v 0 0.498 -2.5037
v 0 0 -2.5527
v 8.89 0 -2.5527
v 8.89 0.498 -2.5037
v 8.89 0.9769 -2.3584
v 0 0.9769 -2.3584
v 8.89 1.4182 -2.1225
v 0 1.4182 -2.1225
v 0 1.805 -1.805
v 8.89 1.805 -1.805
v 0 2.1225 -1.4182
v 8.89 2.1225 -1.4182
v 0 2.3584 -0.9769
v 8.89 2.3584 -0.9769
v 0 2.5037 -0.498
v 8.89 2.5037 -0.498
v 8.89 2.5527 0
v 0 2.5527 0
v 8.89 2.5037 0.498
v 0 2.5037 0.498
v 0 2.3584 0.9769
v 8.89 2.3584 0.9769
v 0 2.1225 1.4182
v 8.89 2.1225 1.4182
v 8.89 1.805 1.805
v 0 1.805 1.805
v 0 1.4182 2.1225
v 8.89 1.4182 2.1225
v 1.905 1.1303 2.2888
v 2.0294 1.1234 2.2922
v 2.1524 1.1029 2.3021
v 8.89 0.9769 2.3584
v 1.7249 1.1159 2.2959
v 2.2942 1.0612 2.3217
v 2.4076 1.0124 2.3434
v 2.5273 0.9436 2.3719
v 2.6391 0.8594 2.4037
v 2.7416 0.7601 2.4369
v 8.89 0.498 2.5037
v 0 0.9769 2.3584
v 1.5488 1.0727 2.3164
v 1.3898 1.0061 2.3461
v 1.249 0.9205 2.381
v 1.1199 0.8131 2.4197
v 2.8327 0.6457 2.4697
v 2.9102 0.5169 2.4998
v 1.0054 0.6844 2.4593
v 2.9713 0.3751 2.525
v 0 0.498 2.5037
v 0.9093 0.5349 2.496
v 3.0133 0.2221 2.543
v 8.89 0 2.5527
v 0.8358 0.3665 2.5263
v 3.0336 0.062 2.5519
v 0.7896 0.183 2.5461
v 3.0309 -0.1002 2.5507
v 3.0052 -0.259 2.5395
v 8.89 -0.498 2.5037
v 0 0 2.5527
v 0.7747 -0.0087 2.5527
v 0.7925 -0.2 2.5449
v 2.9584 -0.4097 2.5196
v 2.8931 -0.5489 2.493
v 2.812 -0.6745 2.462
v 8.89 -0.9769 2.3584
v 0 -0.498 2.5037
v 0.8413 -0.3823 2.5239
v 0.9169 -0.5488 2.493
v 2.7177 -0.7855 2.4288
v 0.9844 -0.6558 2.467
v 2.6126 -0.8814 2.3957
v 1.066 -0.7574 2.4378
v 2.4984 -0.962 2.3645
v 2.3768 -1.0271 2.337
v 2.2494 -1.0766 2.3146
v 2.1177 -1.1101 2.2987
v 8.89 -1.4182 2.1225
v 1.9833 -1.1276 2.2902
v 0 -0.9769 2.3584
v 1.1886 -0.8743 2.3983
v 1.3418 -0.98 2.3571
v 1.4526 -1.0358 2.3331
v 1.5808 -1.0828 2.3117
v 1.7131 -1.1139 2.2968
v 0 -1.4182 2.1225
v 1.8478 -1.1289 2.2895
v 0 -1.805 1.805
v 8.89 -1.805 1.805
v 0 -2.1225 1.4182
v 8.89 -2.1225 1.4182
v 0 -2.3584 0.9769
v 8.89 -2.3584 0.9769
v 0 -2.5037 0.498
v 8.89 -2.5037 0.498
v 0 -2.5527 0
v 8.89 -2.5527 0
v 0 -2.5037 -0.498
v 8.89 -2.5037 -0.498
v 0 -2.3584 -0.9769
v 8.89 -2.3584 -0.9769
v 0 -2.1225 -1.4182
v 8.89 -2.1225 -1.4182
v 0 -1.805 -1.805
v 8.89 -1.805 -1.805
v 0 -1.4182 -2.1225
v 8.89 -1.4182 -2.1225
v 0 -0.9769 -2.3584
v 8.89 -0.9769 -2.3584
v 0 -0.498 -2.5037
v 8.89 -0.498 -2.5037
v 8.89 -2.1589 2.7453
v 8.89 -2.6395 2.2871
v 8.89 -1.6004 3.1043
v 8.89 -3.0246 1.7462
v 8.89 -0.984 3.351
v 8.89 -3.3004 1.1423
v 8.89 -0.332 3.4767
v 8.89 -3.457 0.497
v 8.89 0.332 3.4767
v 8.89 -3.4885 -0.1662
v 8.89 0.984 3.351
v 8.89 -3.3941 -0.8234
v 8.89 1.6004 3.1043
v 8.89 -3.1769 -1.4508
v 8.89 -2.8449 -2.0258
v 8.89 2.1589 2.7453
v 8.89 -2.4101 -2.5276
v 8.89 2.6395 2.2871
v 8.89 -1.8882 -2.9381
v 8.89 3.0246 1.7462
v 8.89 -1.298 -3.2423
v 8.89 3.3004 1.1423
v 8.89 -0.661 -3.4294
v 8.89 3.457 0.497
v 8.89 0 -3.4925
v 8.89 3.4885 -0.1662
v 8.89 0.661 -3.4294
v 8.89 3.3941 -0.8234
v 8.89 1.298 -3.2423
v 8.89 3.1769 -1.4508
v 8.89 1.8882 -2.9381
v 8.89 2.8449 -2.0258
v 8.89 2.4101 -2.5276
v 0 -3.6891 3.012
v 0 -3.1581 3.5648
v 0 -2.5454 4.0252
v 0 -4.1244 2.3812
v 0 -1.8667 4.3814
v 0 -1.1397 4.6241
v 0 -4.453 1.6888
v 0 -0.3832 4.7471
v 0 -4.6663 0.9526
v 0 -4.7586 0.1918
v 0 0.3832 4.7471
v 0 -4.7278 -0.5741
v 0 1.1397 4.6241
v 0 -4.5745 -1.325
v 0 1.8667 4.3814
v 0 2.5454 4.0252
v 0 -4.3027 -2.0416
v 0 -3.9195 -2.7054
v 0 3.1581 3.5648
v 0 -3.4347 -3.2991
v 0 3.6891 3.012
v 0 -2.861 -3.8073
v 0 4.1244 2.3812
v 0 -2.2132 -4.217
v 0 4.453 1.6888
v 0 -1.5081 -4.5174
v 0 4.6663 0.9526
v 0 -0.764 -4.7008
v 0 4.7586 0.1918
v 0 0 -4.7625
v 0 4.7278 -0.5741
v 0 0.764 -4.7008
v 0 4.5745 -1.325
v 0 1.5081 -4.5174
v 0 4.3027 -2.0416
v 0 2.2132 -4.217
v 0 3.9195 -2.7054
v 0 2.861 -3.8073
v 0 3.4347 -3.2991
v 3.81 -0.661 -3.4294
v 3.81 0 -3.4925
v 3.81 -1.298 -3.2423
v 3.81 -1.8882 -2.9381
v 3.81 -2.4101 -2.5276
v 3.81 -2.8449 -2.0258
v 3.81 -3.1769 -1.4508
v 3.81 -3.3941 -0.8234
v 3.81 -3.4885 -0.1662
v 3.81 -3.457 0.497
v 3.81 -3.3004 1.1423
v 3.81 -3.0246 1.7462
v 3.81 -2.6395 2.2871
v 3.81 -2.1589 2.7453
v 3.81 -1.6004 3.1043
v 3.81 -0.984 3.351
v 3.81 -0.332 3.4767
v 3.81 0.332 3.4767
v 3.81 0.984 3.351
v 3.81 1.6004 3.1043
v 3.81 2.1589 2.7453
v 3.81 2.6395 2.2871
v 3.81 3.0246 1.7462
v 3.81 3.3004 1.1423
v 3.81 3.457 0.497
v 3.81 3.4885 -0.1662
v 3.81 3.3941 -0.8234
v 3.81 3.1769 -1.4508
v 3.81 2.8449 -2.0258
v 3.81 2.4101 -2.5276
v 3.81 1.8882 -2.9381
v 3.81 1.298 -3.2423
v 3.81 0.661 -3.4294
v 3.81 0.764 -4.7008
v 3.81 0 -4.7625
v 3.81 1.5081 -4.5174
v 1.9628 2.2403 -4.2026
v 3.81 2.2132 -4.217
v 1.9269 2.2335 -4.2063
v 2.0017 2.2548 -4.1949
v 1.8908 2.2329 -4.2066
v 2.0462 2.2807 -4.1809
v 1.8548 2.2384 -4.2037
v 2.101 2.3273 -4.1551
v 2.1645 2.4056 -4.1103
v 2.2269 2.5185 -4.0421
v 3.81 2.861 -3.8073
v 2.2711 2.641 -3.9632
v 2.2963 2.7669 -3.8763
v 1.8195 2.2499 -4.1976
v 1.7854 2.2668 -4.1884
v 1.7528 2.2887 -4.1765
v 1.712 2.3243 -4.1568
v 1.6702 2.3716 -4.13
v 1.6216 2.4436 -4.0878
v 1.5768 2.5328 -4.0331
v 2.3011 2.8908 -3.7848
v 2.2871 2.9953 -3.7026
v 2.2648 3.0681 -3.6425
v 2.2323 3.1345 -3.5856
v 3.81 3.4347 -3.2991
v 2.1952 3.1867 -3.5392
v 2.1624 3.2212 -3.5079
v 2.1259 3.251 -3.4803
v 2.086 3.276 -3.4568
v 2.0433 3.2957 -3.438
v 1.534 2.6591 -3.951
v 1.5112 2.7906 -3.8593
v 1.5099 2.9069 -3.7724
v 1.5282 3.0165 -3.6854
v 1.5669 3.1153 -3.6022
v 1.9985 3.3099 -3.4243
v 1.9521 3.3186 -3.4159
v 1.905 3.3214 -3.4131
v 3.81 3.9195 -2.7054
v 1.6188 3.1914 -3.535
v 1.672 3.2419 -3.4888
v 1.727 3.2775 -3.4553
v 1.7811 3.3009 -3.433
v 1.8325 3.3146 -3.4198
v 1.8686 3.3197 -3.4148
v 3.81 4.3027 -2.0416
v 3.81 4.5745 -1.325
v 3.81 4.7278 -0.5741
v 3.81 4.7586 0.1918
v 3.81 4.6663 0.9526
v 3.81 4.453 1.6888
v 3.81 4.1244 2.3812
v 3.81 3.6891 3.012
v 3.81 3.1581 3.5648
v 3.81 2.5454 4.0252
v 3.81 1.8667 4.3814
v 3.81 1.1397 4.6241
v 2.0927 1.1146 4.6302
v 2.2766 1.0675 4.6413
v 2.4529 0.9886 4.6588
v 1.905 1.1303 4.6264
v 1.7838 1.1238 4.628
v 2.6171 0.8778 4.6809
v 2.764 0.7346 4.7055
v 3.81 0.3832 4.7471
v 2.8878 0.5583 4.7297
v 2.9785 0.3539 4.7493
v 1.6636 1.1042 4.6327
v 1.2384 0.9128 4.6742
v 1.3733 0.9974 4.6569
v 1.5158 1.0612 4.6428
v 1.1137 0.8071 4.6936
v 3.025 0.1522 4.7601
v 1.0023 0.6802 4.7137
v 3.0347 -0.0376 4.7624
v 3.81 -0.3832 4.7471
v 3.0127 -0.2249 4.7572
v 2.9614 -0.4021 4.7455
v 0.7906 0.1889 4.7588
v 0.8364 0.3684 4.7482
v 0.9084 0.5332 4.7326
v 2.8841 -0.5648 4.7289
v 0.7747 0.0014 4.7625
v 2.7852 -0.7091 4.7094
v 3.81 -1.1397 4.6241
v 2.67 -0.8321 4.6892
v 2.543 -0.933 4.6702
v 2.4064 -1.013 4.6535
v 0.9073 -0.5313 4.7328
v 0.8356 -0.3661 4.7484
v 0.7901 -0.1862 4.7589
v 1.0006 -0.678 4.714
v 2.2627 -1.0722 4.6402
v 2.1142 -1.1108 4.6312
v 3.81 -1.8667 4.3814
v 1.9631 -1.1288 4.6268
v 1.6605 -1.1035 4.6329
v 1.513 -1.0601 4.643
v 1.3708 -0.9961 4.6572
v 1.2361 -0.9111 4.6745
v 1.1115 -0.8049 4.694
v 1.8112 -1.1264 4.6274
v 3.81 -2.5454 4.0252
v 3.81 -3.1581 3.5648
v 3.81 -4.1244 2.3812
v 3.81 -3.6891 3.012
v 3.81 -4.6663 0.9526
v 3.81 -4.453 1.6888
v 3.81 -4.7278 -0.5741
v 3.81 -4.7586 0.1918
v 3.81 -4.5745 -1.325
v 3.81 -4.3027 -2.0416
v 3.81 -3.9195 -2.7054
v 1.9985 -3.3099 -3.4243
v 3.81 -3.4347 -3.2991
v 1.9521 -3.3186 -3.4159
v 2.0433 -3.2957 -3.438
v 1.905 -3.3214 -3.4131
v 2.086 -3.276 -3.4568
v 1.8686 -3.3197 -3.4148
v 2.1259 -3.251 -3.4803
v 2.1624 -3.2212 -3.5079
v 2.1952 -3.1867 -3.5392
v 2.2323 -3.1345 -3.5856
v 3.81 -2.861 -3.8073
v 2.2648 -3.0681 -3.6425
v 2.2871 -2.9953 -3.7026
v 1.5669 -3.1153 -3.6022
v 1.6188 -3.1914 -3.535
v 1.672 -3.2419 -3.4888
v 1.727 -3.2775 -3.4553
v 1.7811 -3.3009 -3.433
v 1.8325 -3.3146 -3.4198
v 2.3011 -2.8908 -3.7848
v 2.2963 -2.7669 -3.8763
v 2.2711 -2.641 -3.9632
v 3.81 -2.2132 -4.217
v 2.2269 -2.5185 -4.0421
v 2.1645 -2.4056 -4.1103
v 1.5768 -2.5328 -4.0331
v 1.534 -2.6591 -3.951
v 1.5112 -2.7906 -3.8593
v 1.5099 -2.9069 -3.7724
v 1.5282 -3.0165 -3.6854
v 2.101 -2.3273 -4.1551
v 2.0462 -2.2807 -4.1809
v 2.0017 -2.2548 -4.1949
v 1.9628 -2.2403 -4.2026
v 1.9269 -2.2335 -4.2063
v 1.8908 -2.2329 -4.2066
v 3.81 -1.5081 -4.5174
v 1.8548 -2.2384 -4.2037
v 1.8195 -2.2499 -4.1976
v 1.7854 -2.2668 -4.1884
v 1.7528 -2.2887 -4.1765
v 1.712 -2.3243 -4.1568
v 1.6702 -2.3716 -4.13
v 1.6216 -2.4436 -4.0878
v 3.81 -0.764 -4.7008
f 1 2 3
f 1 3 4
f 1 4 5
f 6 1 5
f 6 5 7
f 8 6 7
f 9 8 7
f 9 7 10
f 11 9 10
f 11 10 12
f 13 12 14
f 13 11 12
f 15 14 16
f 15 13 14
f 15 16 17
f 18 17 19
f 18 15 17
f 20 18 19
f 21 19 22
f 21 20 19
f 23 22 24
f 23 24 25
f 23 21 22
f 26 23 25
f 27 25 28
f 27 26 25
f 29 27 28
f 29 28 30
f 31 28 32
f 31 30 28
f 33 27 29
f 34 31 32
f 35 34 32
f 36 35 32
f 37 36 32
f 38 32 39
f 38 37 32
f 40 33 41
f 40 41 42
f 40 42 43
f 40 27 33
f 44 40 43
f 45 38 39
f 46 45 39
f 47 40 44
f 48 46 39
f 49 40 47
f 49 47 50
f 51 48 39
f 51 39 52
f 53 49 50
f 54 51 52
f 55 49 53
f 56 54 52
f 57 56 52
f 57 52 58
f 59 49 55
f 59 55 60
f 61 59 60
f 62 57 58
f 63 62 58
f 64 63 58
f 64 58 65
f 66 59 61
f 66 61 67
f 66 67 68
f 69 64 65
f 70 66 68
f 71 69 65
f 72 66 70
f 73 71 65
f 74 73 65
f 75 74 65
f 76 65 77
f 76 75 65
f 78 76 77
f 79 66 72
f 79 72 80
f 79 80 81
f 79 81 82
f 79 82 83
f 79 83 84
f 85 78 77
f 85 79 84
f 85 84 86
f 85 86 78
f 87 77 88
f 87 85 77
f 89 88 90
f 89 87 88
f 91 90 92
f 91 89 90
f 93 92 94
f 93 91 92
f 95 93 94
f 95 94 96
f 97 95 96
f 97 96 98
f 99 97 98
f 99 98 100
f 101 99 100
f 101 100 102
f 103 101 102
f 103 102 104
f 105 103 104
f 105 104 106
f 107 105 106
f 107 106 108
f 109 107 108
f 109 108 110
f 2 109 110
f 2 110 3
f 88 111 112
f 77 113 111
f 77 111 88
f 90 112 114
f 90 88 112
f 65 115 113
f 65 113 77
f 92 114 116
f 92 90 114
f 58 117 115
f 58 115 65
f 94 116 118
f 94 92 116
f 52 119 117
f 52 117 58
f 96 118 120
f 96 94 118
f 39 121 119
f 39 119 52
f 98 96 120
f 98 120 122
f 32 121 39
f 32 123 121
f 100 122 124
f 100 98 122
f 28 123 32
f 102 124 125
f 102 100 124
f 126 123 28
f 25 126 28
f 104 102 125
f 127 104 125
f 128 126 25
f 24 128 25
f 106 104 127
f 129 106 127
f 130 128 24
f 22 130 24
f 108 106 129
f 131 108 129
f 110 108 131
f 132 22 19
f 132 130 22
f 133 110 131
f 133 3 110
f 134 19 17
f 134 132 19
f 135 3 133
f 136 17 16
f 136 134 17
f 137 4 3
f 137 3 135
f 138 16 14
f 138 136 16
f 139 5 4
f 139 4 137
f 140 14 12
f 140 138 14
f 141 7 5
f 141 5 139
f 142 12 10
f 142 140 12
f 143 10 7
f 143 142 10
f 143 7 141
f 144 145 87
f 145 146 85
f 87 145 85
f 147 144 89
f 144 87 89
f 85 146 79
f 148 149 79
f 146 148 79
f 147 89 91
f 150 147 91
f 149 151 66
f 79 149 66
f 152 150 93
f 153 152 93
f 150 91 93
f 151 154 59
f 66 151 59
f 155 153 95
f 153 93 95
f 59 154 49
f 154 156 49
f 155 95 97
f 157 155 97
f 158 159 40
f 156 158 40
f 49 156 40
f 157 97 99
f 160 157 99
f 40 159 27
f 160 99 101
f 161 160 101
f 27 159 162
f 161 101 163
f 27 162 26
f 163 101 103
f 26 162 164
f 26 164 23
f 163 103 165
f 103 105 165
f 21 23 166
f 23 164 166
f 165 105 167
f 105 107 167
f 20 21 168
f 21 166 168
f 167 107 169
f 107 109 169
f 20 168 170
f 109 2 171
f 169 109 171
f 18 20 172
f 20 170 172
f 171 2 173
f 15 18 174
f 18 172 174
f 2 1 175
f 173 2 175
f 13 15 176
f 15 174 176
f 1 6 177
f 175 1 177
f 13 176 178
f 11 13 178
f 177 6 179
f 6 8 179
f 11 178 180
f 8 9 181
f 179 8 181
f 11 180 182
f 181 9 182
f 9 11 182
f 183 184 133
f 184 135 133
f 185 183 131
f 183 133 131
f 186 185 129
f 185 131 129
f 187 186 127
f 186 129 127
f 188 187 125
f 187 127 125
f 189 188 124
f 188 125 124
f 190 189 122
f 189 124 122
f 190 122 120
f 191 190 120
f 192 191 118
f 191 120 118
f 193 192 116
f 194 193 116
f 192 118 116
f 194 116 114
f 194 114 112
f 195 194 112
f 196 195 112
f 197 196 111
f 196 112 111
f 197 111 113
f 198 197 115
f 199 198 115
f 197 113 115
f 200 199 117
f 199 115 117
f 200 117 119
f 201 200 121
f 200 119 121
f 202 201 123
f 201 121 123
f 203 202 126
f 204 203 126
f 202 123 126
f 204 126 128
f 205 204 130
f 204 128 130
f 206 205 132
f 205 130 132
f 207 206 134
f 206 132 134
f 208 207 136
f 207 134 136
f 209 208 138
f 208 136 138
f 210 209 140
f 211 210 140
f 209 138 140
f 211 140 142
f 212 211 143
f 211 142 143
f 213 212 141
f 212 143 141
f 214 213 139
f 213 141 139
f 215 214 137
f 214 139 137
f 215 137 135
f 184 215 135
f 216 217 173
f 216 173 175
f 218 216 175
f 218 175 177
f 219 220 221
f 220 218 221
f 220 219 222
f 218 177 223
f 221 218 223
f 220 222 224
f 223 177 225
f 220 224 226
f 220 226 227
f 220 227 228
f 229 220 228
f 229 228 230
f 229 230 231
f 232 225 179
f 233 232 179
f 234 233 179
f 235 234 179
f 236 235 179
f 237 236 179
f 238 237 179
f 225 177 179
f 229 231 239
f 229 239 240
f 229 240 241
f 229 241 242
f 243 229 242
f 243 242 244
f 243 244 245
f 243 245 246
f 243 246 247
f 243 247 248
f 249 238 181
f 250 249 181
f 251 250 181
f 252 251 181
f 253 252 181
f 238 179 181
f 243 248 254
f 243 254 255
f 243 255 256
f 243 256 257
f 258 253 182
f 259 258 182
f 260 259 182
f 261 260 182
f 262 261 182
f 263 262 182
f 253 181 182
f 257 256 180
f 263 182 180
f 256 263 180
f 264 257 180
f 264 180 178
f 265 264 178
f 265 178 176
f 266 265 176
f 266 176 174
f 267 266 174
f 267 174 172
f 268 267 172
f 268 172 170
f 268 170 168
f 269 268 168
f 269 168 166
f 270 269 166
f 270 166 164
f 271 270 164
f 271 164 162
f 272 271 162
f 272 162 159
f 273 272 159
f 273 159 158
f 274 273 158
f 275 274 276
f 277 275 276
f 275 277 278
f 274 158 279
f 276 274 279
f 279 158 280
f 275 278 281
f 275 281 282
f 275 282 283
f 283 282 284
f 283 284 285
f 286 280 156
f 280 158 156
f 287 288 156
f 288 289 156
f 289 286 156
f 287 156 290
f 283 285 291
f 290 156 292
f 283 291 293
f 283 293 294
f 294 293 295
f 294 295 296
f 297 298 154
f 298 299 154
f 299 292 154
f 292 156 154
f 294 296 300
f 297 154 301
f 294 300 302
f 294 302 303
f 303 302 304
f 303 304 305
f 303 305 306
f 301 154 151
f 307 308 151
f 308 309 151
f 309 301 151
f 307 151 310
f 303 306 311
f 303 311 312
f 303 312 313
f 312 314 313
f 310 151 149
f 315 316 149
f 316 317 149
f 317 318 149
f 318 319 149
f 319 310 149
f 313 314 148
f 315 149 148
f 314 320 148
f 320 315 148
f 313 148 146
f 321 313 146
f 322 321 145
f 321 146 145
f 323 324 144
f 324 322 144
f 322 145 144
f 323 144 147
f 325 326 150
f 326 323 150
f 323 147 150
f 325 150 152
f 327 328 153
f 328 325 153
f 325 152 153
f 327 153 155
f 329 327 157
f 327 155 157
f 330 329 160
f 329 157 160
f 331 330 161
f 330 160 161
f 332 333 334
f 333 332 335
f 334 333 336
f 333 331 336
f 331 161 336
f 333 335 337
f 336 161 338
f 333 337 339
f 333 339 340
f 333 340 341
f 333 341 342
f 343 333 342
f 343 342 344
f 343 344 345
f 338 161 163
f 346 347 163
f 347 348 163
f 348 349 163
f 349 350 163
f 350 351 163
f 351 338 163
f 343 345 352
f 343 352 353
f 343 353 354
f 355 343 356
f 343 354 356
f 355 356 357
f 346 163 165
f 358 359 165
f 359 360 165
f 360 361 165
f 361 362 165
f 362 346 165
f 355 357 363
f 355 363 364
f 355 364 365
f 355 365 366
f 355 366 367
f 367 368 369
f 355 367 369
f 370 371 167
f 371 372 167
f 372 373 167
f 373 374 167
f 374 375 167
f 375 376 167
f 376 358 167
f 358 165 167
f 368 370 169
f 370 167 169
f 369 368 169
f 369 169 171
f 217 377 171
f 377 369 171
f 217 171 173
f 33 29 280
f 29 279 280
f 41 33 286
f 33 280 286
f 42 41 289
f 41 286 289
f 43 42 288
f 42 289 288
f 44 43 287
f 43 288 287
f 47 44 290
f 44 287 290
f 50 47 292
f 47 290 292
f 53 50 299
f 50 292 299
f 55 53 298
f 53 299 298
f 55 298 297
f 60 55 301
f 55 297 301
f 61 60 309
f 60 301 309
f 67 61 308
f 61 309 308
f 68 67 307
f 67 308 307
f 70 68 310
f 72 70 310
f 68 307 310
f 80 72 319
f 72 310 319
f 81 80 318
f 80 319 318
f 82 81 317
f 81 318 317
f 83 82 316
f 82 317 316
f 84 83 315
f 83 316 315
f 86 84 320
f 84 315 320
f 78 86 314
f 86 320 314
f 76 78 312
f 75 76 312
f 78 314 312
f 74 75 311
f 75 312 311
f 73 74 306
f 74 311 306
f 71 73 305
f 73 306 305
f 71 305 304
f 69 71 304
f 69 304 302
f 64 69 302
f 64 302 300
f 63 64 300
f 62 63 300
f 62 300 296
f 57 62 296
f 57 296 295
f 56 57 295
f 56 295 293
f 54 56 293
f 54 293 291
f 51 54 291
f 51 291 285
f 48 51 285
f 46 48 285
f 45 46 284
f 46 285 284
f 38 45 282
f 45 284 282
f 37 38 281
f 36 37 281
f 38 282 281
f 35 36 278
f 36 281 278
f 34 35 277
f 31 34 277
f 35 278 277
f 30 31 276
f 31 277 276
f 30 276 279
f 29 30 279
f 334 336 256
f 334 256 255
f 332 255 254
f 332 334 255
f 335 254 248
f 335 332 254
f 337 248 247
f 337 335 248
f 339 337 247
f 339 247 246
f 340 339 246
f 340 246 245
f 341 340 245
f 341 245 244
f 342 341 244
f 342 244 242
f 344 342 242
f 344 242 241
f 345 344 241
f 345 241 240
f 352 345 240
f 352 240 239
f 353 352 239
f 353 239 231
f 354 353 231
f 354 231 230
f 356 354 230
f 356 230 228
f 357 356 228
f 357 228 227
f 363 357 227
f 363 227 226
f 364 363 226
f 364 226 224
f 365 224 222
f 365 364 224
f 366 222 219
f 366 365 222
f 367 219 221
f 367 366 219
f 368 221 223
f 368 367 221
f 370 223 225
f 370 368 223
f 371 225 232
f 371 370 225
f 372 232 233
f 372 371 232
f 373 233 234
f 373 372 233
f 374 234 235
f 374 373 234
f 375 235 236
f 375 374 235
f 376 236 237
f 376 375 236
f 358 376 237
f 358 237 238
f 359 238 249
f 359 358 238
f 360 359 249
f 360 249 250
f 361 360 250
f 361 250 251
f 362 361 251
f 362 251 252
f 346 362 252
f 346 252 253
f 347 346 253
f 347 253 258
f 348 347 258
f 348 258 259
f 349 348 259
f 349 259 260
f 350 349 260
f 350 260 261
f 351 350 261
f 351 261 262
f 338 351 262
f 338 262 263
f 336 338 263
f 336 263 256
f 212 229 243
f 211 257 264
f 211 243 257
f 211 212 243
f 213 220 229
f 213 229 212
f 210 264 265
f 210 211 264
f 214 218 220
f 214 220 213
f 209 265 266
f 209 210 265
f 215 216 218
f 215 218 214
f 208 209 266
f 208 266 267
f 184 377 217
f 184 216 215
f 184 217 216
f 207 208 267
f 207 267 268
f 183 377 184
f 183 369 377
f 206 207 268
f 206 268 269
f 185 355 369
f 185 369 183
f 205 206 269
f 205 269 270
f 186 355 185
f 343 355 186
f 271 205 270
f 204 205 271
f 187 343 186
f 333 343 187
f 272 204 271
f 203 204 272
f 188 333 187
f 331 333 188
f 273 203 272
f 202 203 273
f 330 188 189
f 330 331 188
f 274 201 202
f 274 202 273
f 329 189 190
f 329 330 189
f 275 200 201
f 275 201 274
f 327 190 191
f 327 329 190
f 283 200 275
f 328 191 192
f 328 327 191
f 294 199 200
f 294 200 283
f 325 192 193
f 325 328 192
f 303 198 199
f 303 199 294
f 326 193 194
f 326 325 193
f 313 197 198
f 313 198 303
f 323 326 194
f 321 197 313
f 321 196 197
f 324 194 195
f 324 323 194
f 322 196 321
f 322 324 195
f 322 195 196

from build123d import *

# Parameters (mm, degrees)
SKETCH1_R               = 4.7625
SKETCH1_R_2             = 2.5527
BOSS_EXTRUDE1_DEPTH     = 8.89
SKETCH2_W               = 5.08
SKETCH2_H               = 1.27
CUT_EXTRUDE1_DEPTH      = 12.153246725
CUT_EXTRUDE1_DEPTH_BACK = 12.153246725
SKETCH7_R               = 0.396875
SKETCH3_W               = 1.1303
SKETCH3_H               = 4.7625


with BuildPart() as part:
    # Sketch1 → Boss-Extrude1 (new body)
    with BuildSketch(Plane(origin=(0, 0, 0), x_dir=(0, 0, -1), z_dir=(1, 0, 0))):
        Circle(SKETCH1_R)
        Circle(SKETCH1_R_2, mode=Mode.SUBTRACT)
    extrude(amount=BOSS_EXTRUDE1_DEPTH)

    # Sketch2 → Cut-Revolve1 (revolve, cut)
    with BuildSketch(Plane.XY, mode=Mode.PRIVATE) as cut_revolve1_sk:
        with Locations((6.35, 4.1275)):
            Rectangle(SKETCH2_W, SKETCH2_H)
    revolve(cut_revolve1_sk.sketch.rotate(Axis((8.89, 0, 0), (-1, 0, 0)), 90), axis=Axis((8.89, 0, 0), (-1, 0, 0)), mode=Mode.SUBTRACT)

    # Sketch7 → Cut-Extrude1 (cut, two sides: drawn at the far end of the back side and taken through both)
    with BuildSketch(Plane(origin=(0, 0, 0), x_dir=(1, 0, 0), z_dir=(0, 1, 0)).offset(-CUT_EXTRUDE1_DEPTH_BACK)):
        with Locations(Location((1.905, 3.81, 0), (0, 0, 270))):
            Circle(SKETCH7_R)
    extrude(amount=CUT_EXTRUDE1_DEPTH + CUT_EXTRUDE1_DEPTH_BACK, mode=Mode.SUBTRACT)

    # Sketch3 → ShaftSetScrew (revolve, cut)
    with BuildSketch(Plane.YZ.offset(1.905)):
        with Locations((0.56515, 2.38125)):
            Rectangle(SKETCH3_W, SKETCH3_H)
    revolve(axis=Axis((1.905, 0, -6.35), (0, 0, 1)), mode=Mode.SUBTRACT)


solid = part.part
